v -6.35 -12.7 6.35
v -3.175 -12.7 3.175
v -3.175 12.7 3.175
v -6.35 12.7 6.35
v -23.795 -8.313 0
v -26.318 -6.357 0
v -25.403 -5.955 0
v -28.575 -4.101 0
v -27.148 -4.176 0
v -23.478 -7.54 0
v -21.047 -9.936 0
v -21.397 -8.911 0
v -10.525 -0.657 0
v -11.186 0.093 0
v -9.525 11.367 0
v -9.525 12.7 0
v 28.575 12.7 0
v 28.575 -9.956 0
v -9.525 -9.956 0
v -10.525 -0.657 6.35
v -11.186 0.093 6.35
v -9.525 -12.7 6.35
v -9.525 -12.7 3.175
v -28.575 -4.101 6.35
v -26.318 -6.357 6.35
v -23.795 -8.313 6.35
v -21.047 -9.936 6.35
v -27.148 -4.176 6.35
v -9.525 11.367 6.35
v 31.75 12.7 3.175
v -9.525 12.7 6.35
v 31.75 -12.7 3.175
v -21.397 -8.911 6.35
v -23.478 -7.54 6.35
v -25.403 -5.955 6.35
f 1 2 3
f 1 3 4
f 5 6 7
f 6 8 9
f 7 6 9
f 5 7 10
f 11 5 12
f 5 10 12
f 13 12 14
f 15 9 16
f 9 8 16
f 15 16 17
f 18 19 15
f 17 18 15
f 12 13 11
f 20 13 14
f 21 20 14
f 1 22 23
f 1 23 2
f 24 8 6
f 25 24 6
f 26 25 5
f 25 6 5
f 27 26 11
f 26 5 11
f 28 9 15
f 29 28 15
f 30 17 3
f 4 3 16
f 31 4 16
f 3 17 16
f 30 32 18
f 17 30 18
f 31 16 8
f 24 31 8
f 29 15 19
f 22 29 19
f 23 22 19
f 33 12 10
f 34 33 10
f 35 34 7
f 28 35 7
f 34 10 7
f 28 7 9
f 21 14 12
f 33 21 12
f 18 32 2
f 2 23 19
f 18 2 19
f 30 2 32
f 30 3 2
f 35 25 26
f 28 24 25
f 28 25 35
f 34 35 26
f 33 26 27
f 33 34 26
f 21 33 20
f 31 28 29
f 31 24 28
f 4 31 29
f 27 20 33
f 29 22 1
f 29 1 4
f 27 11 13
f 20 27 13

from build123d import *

# Parameters (mm, degrees)
F0_W        = 28.575
F0_H        = 25.4
F1_DEPTH    = 3.175
F2_DEPTH    = 6.35
F3_T4_DEPTH = 58.0603739472
F6_DEPTH    = 25.4
F7_DEPTH    = 50.8


# Not quite as in the source:
# - a fillet or chamfer that OpenCascade refuses, or shapes differently, is made with other operations: its cross-section is extruded or revolved along the edge and cut away or added
# - a feature names something its author has since deleted; it is built from what else it names


with BuildPart() as f1:
    # F0 (on Top) → F1 (new body)
    with BuildSketch(Plane.XY):
        with Locations((14.2875, 0)):
            Rectangle(F0_W, F0_H)
        with BuildLine():
            Line((-9.525, -12.7), (0, -12.7))
            Line((0, -12.7), (0, 12.7))
            Line((0, 12.7), (-9.525, 12.7))
            Line((-9.525, 12.7), (-28.575, -4.1005208253))
            ThreePointArc((-28.575, -4.1005208253), (-25.0870430294, -7.374431916), (-21.0470880315, -9.9362869613))
            Line((-21.0470880315, -9.9362869613), (-10.525, -0.6566775598))
            Line((-10.525, -0.6566775598), (-11.1864378278, 0.0933224402))
            Line((-11.1864378278, 0.0933224402), (-21.3967655869, -8.9113402448))
            ThreePointArc((-21.3967655869, -8.9113402448), (-24.4613665471, -6.7728299311), (-27.1481868608, -4.1755232473))
            Line((-27.1481868608, -4.1755232473), (-9.525, 11.3666666667))
            Line((-9.525, 11.3666666667), (-9.525, -12.7))
        make_face()
    extrude(amount=F1_DEPTH)

    # F0 (on Top) → F2 (join)
    with BuildSketch(Plane.XY):
        with BuildLine():
            Line((-9.525, -12.7), (0, -12.7))
            Line((0, -12.7), (0, 12.7))
            Line((0, 12.7), (-9.525, 12.7))
            Line((-9.525, 12.7), (-28.575, -4.1005208253))
            ThreePointArc((-28.575, -4.1005208253), (-25.0870430294, -7.374431916), (-21.0470880315, -9.9362869613))
            Line((-21.0470880315, -9.9362869613), (-10.525, -0.6566775598))
            Line((-10.525, -0.6566775598), (-11.1864378278, 0.0933224402))
            Line((-11.1864378278, 0.0933224402), (-21.3967655869, -8.9113402448))
            ThreePointArc((-21.3967655869, -8.9113402448), (-24.4613665471, -6.7728299311), (-27.1481868608, -4.1755232473))
            Line((-27.1481868608, -4.1755232473), (-9.525, 11.3666666667))
            Line((-9.525, 11.3666666667), (-9.525, -12.7))
        make_face()
    extrude(amount=F2_DEPTH)

    # F3: chamfer of 6.35 on 1 edges, made by hand


with BuildPart() as f3_tool2:
    # F3_s3 → F3_t4 (new body)
    with BuildSketch(Plane.XZ.offset(29.0301869736)):
        Polygon((0, 0), (-6.35, 6.35), (0, 6.35), align=None)
    extrude(amount=-F3_T4_DEPTH)

    split(bisect_by=Plane.XY.offset(3.175), keep=Keep.TOP)


with BuildPart() as f1_1:
    add(f1.part)

    # F3_t1: cut F3_tool2
    add(f3_tool2.part, mode=Mode.SUBTRACT)

    # F5 (on face) → F6 (join)
    with BuildSketch(Plane(origin=(0, 12.7, 0), x_dir=(-1, 0, 0), z_dir=(0, 1, 0))):
        Polygon((3.175, 3.175), (-28.575, 3.175), (-28.575, 0), (9.525, 0), (9.525, 6.35), (6.35, 6.35), align=None)
        Polygon((-28.575, 0), (-28.575, 3.175), (-31.75, 3.175), align=None)
    extrude(amount=-F6_DEPTH)

    # F4 (on face) → F7 (cut)
    with BuildSketch(Plane(origin=(-9.525, 0, 0), x_dir=(0, -1, 0), z_dir=(-1, 0, 0))):
        Polygon((9.9561735988, 0), (12.7, 0), (12.7, 3.175), align=None)
    extrude(amount=-F7_DEPTH, mode=Mode.SUBTRACT)


solid = f1_1.part
